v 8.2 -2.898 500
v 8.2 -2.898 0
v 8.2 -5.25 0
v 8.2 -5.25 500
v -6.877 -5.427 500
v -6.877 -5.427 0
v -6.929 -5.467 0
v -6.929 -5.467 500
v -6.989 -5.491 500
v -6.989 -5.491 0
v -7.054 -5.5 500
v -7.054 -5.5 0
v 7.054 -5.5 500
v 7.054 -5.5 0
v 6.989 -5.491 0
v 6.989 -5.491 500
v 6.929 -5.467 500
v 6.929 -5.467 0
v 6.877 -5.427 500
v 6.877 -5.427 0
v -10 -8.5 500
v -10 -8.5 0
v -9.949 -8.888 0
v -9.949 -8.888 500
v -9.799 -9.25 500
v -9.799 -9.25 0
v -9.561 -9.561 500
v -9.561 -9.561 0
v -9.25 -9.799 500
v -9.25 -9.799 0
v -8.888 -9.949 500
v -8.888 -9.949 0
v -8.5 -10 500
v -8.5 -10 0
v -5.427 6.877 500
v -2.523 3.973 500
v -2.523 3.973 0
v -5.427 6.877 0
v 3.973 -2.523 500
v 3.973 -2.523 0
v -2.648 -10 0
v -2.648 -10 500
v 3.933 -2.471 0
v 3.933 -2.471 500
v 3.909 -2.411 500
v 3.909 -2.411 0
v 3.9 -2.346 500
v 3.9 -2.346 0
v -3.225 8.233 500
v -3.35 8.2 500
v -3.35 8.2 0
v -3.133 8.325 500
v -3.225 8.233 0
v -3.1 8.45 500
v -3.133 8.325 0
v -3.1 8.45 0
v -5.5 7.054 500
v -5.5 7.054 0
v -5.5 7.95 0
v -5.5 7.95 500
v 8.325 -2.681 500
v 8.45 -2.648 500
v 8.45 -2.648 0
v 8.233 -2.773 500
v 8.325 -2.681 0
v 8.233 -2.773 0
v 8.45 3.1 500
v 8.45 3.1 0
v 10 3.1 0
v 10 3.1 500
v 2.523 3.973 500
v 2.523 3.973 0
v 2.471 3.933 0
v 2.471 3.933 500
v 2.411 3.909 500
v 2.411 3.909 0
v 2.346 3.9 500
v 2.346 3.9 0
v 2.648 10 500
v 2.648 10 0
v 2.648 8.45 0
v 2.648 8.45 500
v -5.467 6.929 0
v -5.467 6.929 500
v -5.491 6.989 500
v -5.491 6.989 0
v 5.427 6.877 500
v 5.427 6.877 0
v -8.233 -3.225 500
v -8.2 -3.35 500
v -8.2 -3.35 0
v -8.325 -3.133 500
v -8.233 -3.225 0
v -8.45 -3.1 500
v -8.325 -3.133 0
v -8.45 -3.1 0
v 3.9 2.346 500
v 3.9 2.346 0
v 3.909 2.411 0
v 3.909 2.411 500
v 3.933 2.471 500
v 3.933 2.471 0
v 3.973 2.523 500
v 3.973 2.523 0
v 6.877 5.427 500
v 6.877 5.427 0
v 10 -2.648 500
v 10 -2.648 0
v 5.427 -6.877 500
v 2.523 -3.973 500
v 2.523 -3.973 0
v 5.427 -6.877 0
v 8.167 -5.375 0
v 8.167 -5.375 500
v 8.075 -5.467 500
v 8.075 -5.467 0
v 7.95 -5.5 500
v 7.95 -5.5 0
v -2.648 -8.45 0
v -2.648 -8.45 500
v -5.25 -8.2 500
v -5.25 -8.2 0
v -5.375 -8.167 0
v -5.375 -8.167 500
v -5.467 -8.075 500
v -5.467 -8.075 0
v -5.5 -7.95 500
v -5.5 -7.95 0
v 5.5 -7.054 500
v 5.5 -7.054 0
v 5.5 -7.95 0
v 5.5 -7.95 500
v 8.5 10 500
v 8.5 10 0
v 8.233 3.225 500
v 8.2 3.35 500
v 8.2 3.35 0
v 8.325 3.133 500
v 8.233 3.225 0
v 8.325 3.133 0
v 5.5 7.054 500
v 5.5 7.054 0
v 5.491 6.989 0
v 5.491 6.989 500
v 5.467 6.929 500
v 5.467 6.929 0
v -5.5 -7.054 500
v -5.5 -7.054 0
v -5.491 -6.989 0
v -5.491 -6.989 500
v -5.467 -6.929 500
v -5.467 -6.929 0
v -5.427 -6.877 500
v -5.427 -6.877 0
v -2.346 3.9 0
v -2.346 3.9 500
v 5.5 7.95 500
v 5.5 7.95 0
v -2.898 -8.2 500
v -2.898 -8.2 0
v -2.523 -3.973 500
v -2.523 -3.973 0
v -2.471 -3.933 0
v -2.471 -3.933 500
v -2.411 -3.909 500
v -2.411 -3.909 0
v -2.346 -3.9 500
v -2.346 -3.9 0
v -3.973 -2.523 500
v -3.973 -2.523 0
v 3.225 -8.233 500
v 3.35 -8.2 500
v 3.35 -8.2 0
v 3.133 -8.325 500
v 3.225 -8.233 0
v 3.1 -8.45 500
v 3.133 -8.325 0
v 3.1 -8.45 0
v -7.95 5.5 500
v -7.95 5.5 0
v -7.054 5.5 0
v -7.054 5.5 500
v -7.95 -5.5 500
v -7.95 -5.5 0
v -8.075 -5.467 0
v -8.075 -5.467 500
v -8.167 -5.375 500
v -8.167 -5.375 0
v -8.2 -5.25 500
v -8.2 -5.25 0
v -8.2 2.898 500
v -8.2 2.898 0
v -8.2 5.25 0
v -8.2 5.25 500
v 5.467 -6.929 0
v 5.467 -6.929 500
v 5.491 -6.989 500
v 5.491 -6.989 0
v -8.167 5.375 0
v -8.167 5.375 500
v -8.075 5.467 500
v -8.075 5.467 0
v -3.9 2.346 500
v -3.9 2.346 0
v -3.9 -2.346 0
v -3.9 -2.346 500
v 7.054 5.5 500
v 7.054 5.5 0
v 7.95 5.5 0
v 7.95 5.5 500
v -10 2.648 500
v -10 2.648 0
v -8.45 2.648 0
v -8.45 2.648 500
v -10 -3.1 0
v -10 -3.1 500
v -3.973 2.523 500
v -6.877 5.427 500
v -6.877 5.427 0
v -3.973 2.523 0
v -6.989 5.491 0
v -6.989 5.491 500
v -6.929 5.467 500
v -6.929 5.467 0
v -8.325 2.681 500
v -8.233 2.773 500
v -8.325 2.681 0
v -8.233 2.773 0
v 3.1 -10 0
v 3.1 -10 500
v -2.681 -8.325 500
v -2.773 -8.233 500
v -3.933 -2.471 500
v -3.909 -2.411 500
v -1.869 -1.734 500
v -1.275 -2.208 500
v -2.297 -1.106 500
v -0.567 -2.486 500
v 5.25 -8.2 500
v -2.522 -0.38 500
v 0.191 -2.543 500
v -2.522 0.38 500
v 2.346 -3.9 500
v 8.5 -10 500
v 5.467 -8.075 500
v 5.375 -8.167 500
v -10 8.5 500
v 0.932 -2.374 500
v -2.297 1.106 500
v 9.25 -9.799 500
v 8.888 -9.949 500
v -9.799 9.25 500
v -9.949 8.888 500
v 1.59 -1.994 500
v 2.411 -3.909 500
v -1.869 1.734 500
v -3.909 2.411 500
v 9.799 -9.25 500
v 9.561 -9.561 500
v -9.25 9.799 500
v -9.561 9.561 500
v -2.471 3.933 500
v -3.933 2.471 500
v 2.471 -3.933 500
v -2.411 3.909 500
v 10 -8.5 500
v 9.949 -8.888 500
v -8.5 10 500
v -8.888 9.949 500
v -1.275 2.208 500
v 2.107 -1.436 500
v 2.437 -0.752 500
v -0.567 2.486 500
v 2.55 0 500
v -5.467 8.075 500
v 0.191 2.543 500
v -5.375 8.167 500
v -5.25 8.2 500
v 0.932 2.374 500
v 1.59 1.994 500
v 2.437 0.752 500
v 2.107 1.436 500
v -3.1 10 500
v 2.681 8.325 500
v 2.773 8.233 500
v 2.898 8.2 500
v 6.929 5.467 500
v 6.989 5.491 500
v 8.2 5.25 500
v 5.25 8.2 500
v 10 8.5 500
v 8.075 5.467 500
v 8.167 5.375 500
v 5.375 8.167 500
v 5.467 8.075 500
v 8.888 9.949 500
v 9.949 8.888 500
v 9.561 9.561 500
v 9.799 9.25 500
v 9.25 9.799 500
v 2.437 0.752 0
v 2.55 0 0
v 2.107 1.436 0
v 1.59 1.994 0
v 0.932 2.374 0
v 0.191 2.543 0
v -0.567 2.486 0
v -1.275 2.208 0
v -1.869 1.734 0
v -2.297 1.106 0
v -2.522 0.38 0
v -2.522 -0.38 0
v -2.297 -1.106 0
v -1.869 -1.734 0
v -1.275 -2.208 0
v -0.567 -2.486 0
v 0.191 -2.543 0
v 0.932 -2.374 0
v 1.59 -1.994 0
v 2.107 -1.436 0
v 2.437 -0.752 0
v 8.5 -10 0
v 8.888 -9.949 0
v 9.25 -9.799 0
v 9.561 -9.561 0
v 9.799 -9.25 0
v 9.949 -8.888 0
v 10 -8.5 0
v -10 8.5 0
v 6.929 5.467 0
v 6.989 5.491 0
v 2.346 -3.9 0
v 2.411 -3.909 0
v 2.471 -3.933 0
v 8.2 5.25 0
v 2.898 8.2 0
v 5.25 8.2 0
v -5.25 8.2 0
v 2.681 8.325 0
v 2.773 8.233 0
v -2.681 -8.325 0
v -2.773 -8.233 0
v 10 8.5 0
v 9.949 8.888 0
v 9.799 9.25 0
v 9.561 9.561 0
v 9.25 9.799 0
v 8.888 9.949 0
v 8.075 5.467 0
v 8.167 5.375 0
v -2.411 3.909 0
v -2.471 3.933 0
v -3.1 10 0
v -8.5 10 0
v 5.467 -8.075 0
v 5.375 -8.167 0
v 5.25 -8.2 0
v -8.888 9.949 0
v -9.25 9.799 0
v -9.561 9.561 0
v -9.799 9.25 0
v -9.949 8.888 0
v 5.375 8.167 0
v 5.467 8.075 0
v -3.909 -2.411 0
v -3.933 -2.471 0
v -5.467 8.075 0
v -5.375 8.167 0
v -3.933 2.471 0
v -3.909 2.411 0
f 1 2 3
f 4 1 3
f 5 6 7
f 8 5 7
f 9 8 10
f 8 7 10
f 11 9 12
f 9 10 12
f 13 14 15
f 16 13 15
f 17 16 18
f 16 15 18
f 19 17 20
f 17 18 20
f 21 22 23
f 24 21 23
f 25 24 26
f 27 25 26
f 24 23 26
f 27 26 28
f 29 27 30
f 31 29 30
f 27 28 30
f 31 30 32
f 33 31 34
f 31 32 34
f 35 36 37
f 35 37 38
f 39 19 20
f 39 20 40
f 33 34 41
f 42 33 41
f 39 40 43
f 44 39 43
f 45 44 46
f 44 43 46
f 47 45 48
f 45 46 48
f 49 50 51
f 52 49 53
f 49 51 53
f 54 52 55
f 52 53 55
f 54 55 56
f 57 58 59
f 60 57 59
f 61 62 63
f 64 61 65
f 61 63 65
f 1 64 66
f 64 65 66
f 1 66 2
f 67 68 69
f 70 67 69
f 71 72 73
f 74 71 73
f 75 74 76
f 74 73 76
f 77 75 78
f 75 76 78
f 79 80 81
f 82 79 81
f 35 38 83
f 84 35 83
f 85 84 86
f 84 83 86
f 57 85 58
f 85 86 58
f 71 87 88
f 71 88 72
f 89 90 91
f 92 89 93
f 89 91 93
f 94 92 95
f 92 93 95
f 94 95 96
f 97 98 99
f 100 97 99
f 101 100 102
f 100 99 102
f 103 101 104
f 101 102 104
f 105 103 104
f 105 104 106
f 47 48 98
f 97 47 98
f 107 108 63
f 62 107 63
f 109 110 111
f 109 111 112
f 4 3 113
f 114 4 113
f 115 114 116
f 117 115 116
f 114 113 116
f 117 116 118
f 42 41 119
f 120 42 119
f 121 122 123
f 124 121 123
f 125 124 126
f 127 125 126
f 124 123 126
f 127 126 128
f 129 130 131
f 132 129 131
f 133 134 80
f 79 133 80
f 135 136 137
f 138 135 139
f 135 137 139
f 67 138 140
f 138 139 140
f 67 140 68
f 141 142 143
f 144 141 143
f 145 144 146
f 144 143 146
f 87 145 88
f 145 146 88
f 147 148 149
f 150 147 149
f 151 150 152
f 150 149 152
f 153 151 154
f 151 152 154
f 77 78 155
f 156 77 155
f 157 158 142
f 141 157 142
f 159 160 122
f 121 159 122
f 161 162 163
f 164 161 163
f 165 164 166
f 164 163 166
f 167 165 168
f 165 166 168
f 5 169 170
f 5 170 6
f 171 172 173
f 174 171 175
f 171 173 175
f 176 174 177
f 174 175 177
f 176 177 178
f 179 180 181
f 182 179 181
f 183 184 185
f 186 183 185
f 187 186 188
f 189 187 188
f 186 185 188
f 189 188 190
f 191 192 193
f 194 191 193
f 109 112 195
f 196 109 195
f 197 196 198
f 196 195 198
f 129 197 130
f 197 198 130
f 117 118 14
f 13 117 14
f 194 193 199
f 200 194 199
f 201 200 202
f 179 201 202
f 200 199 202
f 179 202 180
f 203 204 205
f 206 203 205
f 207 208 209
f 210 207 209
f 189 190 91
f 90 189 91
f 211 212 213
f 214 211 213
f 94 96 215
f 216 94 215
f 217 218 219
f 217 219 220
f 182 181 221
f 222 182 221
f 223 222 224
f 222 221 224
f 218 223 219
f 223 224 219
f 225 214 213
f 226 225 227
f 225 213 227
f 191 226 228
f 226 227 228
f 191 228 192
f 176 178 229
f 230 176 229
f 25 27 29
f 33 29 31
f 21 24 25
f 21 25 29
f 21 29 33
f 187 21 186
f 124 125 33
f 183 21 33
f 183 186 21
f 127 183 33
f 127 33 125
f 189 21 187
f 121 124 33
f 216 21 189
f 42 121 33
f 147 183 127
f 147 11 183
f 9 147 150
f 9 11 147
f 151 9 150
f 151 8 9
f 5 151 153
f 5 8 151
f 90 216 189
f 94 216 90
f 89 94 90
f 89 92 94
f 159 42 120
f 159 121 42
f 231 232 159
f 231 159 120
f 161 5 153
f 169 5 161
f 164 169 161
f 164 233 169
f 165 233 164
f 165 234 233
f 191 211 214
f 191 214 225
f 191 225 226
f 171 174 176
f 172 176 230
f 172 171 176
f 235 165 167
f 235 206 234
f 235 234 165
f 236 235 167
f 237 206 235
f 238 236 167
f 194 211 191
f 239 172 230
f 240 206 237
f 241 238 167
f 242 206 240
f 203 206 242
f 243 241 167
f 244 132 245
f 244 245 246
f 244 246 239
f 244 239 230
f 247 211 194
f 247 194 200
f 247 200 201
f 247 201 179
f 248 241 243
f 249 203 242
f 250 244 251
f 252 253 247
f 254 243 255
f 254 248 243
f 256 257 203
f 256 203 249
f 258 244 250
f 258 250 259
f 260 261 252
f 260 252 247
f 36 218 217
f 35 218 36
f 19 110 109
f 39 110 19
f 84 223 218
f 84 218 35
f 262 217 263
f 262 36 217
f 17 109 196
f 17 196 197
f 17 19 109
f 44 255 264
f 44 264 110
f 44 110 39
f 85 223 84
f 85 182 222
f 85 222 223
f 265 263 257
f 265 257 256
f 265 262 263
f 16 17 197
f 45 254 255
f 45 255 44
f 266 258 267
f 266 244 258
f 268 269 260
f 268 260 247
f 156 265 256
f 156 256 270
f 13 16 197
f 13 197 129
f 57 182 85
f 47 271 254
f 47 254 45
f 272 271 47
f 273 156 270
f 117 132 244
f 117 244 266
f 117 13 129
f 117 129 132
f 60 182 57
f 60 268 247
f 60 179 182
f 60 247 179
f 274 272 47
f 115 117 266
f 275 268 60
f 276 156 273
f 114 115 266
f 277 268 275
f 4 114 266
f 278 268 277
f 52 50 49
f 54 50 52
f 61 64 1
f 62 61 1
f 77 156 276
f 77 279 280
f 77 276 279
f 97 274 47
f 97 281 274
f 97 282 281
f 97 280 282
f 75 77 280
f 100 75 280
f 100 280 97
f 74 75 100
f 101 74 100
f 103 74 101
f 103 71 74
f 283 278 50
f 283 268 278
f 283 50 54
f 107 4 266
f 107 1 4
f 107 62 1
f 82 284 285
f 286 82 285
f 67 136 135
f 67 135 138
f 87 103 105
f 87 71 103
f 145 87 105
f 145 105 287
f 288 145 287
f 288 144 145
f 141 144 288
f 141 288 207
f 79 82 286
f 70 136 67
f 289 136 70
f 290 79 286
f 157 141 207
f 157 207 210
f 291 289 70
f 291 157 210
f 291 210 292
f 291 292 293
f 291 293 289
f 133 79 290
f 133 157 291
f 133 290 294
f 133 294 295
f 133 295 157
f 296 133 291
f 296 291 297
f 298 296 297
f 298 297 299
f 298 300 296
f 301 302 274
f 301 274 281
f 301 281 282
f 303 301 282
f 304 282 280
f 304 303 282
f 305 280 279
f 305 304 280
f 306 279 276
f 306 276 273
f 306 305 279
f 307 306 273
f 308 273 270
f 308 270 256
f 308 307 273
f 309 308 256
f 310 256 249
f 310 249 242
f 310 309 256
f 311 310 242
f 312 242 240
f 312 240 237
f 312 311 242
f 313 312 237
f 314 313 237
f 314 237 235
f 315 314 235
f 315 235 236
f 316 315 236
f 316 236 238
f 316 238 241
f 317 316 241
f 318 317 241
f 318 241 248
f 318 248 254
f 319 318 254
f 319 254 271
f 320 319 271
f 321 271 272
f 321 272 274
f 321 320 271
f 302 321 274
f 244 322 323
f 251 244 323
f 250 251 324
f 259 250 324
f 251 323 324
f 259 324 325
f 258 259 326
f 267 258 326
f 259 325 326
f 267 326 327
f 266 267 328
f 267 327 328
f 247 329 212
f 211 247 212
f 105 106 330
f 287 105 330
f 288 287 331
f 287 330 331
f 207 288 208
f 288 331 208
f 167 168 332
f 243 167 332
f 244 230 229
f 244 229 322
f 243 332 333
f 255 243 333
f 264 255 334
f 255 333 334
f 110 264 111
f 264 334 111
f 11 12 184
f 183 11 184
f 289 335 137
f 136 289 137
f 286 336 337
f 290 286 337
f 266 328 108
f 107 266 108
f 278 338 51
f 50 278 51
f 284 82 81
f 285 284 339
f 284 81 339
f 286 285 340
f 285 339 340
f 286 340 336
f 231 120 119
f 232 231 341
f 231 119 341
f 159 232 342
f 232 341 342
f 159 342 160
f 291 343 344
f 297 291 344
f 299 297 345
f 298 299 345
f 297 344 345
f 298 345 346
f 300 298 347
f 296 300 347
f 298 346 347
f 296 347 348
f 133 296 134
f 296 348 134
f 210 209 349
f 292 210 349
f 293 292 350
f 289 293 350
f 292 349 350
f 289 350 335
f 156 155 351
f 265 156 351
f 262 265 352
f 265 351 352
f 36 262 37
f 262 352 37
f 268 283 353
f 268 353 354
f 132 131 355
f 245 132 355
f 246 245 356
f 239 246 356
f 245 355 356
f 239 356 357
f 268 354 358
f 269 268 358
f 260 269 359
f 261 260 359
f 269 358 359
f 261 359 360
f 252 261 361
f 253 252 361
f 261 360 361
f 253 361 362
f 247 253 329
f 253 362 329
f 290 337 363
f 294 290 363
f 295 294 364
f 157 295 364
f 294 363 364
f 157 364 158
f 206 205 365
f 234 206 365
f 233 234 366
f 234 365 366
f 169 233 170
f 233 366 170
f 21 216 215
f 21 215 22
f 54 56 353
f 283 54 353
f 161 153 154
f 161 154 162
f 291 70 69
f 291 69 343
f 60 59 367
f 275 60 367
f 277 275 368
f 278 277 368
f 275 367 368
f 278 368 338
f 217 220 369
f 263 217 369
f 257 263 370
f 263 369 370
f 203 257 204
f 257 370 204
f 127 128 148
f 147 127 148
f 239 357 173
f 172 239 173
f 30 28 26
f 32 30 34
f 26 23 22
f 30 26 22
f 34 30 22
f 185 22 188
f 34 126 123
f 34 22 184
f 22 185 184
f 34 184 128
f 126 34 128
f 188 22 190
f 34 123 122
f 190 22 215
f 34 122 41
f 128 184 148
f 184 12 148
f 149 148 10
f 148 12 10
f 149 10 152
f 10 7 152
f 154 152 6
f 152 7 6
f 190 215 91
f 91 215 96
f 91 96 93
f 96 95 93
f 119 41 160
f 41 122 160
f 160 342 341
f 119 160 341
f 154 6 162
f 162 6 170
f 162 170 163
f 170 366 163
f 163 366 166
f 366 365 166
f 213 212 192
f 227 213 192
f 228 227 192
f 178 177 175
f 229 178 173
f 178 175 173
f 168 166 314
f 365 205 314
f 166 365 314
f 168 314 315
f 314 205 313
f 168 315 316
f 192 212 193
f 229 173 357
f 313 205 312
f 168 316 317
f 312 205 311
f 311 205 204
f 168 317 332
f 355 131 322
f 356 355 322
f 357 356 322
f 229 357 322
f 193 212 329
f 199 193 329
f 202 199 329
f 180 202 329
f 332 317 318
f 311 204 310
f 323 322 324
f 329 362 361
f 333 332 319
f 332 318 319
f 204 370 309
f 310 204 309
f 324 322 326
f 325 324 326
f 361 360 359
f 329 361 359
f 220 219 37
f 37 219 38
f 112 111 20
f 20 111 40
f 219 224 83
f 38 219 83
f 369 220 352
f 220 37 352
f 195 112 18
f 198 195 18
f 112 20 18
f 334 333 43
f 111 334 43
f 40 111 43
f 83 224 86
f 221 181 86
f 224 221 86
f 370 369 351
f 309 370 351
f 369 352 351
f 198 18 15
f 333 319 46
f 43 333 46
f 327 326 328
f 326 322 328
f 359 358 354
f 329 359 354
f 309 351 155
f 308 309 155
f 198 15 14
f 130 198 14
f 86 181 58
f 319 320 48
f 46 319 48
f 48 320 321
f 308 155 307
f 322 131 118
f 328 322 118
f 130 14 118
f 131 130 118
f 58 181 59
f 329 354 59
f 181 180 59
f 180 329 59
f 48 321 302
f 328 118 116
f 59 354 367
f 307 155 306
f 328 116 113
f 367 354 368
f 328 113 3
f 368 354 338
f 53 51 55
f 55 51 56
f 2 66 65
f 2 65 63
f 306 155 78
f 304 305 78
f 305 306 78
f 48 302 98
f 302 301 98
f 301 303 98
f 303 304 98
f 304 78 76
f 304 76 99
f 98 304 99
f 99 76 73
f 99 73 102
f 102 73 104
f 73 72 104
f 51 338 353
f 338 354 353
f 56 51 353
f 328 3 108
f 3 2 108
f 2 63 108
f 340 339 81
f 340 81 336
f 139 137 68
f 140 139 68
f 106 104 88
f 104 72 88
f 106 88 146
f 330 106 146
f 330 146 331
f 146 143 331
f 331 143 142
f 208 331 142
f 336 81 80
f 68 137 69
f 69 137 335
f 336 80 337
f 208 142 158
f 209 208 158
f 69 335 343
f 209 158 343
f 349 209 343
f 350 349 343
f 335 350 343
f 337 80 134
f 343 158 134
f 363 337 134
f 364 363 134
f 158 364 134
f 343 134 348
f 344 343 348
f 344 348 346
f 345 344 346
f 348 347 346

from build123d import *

# Parameters (mm, degrees)
SKETCH1_R           = 2.55
BOSS_EXTRUDE1_DEPTH = 500


with BuildPart() as part:
    # Sketch1 → Boss-Extrude1 (new body)
    with BuildSketch(Plane.XY):
        with BuildLine():
            Line((-8.5, -10), (-2.647623804, -10))
            Line((-2.647623804, -10), (-2.647623804, -8.45))
            ThreePointArc((-2.647623804, -8.45), (-2.720847109, -8.273223305), (-2.897623804, -8.2))
            Line((-2.897623804, -8.2), (-5.25, -8.2))
            ThreePointArc((-5.25, -8.2), (-5.426776695, -8.126776695), (-5.5, -7.95))
            Line((-5.5, -7.95), (-5.5, -7.053553391))
            ThreePointArc((-5.5, -7.053553391), (-5.480969883, -6.957882533), (-5.426776695, -6.876776695))
            Line((-5.426776695, -6.876776695), (-2.523223305, -3.973223305))
            ThreePointArc((-2.523223305, -3.973223305), (-2.442117467, -3.919030117), (-2.346446609, -3.9))
            Line((-2.346446609, -3.9), (2.346446609, -3.9))
            ThreePointArc((2.346446609, -3.9), (2.442117467, -3.919030117), (2.523223305, -3.973223305))
            Line((2.523223305, -3.973223305), (5.426776695, -6.876776695))
            ThreePointArc((5.426776695, -6.876776695), (5.480969883, -6.957882533), (5.5, -7.053553391))
            Line((5.5, -7.053553391), (5.5, -7.95))
            ThreePointArc((5.5, -7.95), (5.426776695, -8.126776695), (5.25, -8.2))
            Line((5.25, -8.2), (3.35, -8.2))
            ThreePointArc((3.35, -8.2), (3.173223305, -8.273223305), (3.1, -8.45))
            Line((3.1, -8.45), (3.1, -10))
            Line((3.1, -10), (8.5, -10))
            ThreePointArc((8.5, -10), (9.560660172, -9.560660172), (10, -8.5))
            Line((10, -8.5), (10, -2.647623804))
            Line((10, -2.647623804), (8.45, -2.647623804))
            ThreePointArc((8.45, -2.647623804), (8.273223305, -2.720847109), (8.2, -2.897623804))
            Line((8.2, -2.897623804), (8.2, -5.25))
            ThreePointArc((8.2, -5.25), (8.126776695, -5.426776695), (7.95, -5.5))
            Line((7.95, -5.5), (7.053553391, -5.5))
            ThreePointArc((7.053553391, -5.5), (6.957882533, -5.480969883), (6.876776695, -5.426776695))
            Line((6.876776695, -5.426776695), (3.973223305, -2.523223305))
            ThreePointArc((3.973223305, -2.523223305), (3.919030117, -2.442117467), (3.9, -2.346446609))
            Line((3.9, -2.346446609), (3.9, 2.346446609))
            ThreePointArc((3.9, 2.346446609), (3.919030117, 2.442117467), (3.973223305, 2.523223305))
            Line((3.973223305, 2.523223305), (6.876776695, 5.426776695))
            ThreePointArc((6.876776695, 5.426776695), (6.957882533, 5.480969883), (7.053553391, 5.5))
            Line((7.053553391, 5.5), (7.95, 5.5))
            ThreePointArc((7.95, 5.5), (8.126776695, 5.426776695), (8.2, 5.25))
            Line((8.2, 5.25), (8.2, 3.35))
            ThreePointArc((8.2, 3.35), (8.273223305, 3.173223305), (8.45, 3.1))
            Line((8.45, 3.1), (10, 3.1))
            Line((10, 3.1), (10, 8.5))
            ThreePointArc((10, 8.5), (9.560660172, 9.560660172), (8.5, 10))
            Line((8.5, 10), (2.647623804, 10))
            Line((2.647623804, 10), (2.647623804, 8.45))
            ThreePointArc((2.647623804, 8.45), (2.720847109, 8.273223305), (2.897623804, 8.2))
            Line((2.897623804, 8.2), (5.25, 8.2))
            ThreePointArc((5.25, 8.2), (5.426776695, 8.126776695), (5.5, 7.95))
            Line((5.5, 7.95), (5.5, 7.053553391))
            ThreePointArc((5.5, 7.053553391), (5.480969883, 6.957882533), (5.426776695, 6.876776695))
            Line((5.426776695, 6.876776695), (2.523223305, 3.973223305))
            ThreePointArc((2.523223305, 3.973223305), (2.442117467, 3.919030117), (2.346446609, 3.9))
            Line((2.346446609, 3.9), (-2.346446609, 3.9))
            ThreePointArc((-2.346446609, 3.9), (-2.442117467, 3.919030117), (-2.523223305, 3.973223305))
            Line((-2.523223305, 3.973223305), (-5.426776695, 6.876776695))
            ThreePointArc((-5.426776695, 6.876776695), (-5.480969883, 6.957882533), (-5.5, 7.053553391))
            Line((-5.5, 7.053553391), (-5.5, 7.95))
            ThreePointArc((-5.5, 7.95), (-5.426776695, 8.126776695), (-5.25, 8.2))
            Line((-5.25, 8.2), (-3.35, 8.2))
            ThreePointArc((-3.35, 8.2), (-3.173223305, 8.273223305), (-3.1, 8.45))
            Line((-3.1, 8.45), (-3.1, 10))
            Line((-3.1, 10), (-8.5, 10))
            ThreePointArc((-8.5, 10), (-9.560660172, 9.560660172), (-10, 8.5))
            Line((-10, 8.5), (-10, 2.647623804))
            Line((-10, 2.647623804), (-8.45, 2.647623804))
            ThreePointArc((-8.45, 2.647623804), (-8.273223305, 2.720847109), (-8.2, 2.897623804))
            Line((-8.2, 2.897623804), (-8.2, 5.25))
            ThreePointArc((-8.2, 5.25), (-8.126776695, 5.426776695), (-7.95, 5.5))
            Line((-7.95, 5.5), (-7.053553391, 5.5))
            ThreePointArc((-7.053553391, 5.5), (-6.957882533, 5.480969883), (-6.876776695, 5.426776695))
            Line((-6.876776695, 5.426776695), (-3.973223305, 2.523223305))
            ThreePointArc((-3.973223305, 2.523223305), (-3.919030117, 2.442117467), (-3.9, 2.346446609))
            Line((-3.9, 2.346446609), (-3.9, -2.346446609))
            ThreePointArc((-3.9, -2.346446609), (-3.919030117, -2.442117467), (-3.973223305, -2.523223305))
            Line((-3.973223305, -2.523223305), (-6.876776695, -5.426776695))
            ThreePointArc((-6.876776695, -5.426776695), (-6.957882533, -5.480969883), (-7.053553391, -5.5))
            Line((-7.053553391, -5.5), (-7.95, -5.5))
            ThreePointArc((-7.95, -5.5), (-8.126776695, -5.426776695), (-8.2, -5.25))
            Line((-8.2, -5.25), (-8.2, -3.35))
            ThreePointArc((-8.2, -3.35), (-8.273223305, -3.173223305), (-8.45, -3.1))
            Line((-8.45, -3.1), (-10, -3.1))
            Line((-10, -3.1), (-10, -8.5))
            ThreePointArc((-10, -8.5), (-9.560660172, -9.560660172), (-8.5, -10))
        make_face()
        Circle(SKETCH1_R, mode=Mode.SUBTRACT)
    extrude(amount=BOSS_EXTRUDE1_DEPTH)


solid = part.part
